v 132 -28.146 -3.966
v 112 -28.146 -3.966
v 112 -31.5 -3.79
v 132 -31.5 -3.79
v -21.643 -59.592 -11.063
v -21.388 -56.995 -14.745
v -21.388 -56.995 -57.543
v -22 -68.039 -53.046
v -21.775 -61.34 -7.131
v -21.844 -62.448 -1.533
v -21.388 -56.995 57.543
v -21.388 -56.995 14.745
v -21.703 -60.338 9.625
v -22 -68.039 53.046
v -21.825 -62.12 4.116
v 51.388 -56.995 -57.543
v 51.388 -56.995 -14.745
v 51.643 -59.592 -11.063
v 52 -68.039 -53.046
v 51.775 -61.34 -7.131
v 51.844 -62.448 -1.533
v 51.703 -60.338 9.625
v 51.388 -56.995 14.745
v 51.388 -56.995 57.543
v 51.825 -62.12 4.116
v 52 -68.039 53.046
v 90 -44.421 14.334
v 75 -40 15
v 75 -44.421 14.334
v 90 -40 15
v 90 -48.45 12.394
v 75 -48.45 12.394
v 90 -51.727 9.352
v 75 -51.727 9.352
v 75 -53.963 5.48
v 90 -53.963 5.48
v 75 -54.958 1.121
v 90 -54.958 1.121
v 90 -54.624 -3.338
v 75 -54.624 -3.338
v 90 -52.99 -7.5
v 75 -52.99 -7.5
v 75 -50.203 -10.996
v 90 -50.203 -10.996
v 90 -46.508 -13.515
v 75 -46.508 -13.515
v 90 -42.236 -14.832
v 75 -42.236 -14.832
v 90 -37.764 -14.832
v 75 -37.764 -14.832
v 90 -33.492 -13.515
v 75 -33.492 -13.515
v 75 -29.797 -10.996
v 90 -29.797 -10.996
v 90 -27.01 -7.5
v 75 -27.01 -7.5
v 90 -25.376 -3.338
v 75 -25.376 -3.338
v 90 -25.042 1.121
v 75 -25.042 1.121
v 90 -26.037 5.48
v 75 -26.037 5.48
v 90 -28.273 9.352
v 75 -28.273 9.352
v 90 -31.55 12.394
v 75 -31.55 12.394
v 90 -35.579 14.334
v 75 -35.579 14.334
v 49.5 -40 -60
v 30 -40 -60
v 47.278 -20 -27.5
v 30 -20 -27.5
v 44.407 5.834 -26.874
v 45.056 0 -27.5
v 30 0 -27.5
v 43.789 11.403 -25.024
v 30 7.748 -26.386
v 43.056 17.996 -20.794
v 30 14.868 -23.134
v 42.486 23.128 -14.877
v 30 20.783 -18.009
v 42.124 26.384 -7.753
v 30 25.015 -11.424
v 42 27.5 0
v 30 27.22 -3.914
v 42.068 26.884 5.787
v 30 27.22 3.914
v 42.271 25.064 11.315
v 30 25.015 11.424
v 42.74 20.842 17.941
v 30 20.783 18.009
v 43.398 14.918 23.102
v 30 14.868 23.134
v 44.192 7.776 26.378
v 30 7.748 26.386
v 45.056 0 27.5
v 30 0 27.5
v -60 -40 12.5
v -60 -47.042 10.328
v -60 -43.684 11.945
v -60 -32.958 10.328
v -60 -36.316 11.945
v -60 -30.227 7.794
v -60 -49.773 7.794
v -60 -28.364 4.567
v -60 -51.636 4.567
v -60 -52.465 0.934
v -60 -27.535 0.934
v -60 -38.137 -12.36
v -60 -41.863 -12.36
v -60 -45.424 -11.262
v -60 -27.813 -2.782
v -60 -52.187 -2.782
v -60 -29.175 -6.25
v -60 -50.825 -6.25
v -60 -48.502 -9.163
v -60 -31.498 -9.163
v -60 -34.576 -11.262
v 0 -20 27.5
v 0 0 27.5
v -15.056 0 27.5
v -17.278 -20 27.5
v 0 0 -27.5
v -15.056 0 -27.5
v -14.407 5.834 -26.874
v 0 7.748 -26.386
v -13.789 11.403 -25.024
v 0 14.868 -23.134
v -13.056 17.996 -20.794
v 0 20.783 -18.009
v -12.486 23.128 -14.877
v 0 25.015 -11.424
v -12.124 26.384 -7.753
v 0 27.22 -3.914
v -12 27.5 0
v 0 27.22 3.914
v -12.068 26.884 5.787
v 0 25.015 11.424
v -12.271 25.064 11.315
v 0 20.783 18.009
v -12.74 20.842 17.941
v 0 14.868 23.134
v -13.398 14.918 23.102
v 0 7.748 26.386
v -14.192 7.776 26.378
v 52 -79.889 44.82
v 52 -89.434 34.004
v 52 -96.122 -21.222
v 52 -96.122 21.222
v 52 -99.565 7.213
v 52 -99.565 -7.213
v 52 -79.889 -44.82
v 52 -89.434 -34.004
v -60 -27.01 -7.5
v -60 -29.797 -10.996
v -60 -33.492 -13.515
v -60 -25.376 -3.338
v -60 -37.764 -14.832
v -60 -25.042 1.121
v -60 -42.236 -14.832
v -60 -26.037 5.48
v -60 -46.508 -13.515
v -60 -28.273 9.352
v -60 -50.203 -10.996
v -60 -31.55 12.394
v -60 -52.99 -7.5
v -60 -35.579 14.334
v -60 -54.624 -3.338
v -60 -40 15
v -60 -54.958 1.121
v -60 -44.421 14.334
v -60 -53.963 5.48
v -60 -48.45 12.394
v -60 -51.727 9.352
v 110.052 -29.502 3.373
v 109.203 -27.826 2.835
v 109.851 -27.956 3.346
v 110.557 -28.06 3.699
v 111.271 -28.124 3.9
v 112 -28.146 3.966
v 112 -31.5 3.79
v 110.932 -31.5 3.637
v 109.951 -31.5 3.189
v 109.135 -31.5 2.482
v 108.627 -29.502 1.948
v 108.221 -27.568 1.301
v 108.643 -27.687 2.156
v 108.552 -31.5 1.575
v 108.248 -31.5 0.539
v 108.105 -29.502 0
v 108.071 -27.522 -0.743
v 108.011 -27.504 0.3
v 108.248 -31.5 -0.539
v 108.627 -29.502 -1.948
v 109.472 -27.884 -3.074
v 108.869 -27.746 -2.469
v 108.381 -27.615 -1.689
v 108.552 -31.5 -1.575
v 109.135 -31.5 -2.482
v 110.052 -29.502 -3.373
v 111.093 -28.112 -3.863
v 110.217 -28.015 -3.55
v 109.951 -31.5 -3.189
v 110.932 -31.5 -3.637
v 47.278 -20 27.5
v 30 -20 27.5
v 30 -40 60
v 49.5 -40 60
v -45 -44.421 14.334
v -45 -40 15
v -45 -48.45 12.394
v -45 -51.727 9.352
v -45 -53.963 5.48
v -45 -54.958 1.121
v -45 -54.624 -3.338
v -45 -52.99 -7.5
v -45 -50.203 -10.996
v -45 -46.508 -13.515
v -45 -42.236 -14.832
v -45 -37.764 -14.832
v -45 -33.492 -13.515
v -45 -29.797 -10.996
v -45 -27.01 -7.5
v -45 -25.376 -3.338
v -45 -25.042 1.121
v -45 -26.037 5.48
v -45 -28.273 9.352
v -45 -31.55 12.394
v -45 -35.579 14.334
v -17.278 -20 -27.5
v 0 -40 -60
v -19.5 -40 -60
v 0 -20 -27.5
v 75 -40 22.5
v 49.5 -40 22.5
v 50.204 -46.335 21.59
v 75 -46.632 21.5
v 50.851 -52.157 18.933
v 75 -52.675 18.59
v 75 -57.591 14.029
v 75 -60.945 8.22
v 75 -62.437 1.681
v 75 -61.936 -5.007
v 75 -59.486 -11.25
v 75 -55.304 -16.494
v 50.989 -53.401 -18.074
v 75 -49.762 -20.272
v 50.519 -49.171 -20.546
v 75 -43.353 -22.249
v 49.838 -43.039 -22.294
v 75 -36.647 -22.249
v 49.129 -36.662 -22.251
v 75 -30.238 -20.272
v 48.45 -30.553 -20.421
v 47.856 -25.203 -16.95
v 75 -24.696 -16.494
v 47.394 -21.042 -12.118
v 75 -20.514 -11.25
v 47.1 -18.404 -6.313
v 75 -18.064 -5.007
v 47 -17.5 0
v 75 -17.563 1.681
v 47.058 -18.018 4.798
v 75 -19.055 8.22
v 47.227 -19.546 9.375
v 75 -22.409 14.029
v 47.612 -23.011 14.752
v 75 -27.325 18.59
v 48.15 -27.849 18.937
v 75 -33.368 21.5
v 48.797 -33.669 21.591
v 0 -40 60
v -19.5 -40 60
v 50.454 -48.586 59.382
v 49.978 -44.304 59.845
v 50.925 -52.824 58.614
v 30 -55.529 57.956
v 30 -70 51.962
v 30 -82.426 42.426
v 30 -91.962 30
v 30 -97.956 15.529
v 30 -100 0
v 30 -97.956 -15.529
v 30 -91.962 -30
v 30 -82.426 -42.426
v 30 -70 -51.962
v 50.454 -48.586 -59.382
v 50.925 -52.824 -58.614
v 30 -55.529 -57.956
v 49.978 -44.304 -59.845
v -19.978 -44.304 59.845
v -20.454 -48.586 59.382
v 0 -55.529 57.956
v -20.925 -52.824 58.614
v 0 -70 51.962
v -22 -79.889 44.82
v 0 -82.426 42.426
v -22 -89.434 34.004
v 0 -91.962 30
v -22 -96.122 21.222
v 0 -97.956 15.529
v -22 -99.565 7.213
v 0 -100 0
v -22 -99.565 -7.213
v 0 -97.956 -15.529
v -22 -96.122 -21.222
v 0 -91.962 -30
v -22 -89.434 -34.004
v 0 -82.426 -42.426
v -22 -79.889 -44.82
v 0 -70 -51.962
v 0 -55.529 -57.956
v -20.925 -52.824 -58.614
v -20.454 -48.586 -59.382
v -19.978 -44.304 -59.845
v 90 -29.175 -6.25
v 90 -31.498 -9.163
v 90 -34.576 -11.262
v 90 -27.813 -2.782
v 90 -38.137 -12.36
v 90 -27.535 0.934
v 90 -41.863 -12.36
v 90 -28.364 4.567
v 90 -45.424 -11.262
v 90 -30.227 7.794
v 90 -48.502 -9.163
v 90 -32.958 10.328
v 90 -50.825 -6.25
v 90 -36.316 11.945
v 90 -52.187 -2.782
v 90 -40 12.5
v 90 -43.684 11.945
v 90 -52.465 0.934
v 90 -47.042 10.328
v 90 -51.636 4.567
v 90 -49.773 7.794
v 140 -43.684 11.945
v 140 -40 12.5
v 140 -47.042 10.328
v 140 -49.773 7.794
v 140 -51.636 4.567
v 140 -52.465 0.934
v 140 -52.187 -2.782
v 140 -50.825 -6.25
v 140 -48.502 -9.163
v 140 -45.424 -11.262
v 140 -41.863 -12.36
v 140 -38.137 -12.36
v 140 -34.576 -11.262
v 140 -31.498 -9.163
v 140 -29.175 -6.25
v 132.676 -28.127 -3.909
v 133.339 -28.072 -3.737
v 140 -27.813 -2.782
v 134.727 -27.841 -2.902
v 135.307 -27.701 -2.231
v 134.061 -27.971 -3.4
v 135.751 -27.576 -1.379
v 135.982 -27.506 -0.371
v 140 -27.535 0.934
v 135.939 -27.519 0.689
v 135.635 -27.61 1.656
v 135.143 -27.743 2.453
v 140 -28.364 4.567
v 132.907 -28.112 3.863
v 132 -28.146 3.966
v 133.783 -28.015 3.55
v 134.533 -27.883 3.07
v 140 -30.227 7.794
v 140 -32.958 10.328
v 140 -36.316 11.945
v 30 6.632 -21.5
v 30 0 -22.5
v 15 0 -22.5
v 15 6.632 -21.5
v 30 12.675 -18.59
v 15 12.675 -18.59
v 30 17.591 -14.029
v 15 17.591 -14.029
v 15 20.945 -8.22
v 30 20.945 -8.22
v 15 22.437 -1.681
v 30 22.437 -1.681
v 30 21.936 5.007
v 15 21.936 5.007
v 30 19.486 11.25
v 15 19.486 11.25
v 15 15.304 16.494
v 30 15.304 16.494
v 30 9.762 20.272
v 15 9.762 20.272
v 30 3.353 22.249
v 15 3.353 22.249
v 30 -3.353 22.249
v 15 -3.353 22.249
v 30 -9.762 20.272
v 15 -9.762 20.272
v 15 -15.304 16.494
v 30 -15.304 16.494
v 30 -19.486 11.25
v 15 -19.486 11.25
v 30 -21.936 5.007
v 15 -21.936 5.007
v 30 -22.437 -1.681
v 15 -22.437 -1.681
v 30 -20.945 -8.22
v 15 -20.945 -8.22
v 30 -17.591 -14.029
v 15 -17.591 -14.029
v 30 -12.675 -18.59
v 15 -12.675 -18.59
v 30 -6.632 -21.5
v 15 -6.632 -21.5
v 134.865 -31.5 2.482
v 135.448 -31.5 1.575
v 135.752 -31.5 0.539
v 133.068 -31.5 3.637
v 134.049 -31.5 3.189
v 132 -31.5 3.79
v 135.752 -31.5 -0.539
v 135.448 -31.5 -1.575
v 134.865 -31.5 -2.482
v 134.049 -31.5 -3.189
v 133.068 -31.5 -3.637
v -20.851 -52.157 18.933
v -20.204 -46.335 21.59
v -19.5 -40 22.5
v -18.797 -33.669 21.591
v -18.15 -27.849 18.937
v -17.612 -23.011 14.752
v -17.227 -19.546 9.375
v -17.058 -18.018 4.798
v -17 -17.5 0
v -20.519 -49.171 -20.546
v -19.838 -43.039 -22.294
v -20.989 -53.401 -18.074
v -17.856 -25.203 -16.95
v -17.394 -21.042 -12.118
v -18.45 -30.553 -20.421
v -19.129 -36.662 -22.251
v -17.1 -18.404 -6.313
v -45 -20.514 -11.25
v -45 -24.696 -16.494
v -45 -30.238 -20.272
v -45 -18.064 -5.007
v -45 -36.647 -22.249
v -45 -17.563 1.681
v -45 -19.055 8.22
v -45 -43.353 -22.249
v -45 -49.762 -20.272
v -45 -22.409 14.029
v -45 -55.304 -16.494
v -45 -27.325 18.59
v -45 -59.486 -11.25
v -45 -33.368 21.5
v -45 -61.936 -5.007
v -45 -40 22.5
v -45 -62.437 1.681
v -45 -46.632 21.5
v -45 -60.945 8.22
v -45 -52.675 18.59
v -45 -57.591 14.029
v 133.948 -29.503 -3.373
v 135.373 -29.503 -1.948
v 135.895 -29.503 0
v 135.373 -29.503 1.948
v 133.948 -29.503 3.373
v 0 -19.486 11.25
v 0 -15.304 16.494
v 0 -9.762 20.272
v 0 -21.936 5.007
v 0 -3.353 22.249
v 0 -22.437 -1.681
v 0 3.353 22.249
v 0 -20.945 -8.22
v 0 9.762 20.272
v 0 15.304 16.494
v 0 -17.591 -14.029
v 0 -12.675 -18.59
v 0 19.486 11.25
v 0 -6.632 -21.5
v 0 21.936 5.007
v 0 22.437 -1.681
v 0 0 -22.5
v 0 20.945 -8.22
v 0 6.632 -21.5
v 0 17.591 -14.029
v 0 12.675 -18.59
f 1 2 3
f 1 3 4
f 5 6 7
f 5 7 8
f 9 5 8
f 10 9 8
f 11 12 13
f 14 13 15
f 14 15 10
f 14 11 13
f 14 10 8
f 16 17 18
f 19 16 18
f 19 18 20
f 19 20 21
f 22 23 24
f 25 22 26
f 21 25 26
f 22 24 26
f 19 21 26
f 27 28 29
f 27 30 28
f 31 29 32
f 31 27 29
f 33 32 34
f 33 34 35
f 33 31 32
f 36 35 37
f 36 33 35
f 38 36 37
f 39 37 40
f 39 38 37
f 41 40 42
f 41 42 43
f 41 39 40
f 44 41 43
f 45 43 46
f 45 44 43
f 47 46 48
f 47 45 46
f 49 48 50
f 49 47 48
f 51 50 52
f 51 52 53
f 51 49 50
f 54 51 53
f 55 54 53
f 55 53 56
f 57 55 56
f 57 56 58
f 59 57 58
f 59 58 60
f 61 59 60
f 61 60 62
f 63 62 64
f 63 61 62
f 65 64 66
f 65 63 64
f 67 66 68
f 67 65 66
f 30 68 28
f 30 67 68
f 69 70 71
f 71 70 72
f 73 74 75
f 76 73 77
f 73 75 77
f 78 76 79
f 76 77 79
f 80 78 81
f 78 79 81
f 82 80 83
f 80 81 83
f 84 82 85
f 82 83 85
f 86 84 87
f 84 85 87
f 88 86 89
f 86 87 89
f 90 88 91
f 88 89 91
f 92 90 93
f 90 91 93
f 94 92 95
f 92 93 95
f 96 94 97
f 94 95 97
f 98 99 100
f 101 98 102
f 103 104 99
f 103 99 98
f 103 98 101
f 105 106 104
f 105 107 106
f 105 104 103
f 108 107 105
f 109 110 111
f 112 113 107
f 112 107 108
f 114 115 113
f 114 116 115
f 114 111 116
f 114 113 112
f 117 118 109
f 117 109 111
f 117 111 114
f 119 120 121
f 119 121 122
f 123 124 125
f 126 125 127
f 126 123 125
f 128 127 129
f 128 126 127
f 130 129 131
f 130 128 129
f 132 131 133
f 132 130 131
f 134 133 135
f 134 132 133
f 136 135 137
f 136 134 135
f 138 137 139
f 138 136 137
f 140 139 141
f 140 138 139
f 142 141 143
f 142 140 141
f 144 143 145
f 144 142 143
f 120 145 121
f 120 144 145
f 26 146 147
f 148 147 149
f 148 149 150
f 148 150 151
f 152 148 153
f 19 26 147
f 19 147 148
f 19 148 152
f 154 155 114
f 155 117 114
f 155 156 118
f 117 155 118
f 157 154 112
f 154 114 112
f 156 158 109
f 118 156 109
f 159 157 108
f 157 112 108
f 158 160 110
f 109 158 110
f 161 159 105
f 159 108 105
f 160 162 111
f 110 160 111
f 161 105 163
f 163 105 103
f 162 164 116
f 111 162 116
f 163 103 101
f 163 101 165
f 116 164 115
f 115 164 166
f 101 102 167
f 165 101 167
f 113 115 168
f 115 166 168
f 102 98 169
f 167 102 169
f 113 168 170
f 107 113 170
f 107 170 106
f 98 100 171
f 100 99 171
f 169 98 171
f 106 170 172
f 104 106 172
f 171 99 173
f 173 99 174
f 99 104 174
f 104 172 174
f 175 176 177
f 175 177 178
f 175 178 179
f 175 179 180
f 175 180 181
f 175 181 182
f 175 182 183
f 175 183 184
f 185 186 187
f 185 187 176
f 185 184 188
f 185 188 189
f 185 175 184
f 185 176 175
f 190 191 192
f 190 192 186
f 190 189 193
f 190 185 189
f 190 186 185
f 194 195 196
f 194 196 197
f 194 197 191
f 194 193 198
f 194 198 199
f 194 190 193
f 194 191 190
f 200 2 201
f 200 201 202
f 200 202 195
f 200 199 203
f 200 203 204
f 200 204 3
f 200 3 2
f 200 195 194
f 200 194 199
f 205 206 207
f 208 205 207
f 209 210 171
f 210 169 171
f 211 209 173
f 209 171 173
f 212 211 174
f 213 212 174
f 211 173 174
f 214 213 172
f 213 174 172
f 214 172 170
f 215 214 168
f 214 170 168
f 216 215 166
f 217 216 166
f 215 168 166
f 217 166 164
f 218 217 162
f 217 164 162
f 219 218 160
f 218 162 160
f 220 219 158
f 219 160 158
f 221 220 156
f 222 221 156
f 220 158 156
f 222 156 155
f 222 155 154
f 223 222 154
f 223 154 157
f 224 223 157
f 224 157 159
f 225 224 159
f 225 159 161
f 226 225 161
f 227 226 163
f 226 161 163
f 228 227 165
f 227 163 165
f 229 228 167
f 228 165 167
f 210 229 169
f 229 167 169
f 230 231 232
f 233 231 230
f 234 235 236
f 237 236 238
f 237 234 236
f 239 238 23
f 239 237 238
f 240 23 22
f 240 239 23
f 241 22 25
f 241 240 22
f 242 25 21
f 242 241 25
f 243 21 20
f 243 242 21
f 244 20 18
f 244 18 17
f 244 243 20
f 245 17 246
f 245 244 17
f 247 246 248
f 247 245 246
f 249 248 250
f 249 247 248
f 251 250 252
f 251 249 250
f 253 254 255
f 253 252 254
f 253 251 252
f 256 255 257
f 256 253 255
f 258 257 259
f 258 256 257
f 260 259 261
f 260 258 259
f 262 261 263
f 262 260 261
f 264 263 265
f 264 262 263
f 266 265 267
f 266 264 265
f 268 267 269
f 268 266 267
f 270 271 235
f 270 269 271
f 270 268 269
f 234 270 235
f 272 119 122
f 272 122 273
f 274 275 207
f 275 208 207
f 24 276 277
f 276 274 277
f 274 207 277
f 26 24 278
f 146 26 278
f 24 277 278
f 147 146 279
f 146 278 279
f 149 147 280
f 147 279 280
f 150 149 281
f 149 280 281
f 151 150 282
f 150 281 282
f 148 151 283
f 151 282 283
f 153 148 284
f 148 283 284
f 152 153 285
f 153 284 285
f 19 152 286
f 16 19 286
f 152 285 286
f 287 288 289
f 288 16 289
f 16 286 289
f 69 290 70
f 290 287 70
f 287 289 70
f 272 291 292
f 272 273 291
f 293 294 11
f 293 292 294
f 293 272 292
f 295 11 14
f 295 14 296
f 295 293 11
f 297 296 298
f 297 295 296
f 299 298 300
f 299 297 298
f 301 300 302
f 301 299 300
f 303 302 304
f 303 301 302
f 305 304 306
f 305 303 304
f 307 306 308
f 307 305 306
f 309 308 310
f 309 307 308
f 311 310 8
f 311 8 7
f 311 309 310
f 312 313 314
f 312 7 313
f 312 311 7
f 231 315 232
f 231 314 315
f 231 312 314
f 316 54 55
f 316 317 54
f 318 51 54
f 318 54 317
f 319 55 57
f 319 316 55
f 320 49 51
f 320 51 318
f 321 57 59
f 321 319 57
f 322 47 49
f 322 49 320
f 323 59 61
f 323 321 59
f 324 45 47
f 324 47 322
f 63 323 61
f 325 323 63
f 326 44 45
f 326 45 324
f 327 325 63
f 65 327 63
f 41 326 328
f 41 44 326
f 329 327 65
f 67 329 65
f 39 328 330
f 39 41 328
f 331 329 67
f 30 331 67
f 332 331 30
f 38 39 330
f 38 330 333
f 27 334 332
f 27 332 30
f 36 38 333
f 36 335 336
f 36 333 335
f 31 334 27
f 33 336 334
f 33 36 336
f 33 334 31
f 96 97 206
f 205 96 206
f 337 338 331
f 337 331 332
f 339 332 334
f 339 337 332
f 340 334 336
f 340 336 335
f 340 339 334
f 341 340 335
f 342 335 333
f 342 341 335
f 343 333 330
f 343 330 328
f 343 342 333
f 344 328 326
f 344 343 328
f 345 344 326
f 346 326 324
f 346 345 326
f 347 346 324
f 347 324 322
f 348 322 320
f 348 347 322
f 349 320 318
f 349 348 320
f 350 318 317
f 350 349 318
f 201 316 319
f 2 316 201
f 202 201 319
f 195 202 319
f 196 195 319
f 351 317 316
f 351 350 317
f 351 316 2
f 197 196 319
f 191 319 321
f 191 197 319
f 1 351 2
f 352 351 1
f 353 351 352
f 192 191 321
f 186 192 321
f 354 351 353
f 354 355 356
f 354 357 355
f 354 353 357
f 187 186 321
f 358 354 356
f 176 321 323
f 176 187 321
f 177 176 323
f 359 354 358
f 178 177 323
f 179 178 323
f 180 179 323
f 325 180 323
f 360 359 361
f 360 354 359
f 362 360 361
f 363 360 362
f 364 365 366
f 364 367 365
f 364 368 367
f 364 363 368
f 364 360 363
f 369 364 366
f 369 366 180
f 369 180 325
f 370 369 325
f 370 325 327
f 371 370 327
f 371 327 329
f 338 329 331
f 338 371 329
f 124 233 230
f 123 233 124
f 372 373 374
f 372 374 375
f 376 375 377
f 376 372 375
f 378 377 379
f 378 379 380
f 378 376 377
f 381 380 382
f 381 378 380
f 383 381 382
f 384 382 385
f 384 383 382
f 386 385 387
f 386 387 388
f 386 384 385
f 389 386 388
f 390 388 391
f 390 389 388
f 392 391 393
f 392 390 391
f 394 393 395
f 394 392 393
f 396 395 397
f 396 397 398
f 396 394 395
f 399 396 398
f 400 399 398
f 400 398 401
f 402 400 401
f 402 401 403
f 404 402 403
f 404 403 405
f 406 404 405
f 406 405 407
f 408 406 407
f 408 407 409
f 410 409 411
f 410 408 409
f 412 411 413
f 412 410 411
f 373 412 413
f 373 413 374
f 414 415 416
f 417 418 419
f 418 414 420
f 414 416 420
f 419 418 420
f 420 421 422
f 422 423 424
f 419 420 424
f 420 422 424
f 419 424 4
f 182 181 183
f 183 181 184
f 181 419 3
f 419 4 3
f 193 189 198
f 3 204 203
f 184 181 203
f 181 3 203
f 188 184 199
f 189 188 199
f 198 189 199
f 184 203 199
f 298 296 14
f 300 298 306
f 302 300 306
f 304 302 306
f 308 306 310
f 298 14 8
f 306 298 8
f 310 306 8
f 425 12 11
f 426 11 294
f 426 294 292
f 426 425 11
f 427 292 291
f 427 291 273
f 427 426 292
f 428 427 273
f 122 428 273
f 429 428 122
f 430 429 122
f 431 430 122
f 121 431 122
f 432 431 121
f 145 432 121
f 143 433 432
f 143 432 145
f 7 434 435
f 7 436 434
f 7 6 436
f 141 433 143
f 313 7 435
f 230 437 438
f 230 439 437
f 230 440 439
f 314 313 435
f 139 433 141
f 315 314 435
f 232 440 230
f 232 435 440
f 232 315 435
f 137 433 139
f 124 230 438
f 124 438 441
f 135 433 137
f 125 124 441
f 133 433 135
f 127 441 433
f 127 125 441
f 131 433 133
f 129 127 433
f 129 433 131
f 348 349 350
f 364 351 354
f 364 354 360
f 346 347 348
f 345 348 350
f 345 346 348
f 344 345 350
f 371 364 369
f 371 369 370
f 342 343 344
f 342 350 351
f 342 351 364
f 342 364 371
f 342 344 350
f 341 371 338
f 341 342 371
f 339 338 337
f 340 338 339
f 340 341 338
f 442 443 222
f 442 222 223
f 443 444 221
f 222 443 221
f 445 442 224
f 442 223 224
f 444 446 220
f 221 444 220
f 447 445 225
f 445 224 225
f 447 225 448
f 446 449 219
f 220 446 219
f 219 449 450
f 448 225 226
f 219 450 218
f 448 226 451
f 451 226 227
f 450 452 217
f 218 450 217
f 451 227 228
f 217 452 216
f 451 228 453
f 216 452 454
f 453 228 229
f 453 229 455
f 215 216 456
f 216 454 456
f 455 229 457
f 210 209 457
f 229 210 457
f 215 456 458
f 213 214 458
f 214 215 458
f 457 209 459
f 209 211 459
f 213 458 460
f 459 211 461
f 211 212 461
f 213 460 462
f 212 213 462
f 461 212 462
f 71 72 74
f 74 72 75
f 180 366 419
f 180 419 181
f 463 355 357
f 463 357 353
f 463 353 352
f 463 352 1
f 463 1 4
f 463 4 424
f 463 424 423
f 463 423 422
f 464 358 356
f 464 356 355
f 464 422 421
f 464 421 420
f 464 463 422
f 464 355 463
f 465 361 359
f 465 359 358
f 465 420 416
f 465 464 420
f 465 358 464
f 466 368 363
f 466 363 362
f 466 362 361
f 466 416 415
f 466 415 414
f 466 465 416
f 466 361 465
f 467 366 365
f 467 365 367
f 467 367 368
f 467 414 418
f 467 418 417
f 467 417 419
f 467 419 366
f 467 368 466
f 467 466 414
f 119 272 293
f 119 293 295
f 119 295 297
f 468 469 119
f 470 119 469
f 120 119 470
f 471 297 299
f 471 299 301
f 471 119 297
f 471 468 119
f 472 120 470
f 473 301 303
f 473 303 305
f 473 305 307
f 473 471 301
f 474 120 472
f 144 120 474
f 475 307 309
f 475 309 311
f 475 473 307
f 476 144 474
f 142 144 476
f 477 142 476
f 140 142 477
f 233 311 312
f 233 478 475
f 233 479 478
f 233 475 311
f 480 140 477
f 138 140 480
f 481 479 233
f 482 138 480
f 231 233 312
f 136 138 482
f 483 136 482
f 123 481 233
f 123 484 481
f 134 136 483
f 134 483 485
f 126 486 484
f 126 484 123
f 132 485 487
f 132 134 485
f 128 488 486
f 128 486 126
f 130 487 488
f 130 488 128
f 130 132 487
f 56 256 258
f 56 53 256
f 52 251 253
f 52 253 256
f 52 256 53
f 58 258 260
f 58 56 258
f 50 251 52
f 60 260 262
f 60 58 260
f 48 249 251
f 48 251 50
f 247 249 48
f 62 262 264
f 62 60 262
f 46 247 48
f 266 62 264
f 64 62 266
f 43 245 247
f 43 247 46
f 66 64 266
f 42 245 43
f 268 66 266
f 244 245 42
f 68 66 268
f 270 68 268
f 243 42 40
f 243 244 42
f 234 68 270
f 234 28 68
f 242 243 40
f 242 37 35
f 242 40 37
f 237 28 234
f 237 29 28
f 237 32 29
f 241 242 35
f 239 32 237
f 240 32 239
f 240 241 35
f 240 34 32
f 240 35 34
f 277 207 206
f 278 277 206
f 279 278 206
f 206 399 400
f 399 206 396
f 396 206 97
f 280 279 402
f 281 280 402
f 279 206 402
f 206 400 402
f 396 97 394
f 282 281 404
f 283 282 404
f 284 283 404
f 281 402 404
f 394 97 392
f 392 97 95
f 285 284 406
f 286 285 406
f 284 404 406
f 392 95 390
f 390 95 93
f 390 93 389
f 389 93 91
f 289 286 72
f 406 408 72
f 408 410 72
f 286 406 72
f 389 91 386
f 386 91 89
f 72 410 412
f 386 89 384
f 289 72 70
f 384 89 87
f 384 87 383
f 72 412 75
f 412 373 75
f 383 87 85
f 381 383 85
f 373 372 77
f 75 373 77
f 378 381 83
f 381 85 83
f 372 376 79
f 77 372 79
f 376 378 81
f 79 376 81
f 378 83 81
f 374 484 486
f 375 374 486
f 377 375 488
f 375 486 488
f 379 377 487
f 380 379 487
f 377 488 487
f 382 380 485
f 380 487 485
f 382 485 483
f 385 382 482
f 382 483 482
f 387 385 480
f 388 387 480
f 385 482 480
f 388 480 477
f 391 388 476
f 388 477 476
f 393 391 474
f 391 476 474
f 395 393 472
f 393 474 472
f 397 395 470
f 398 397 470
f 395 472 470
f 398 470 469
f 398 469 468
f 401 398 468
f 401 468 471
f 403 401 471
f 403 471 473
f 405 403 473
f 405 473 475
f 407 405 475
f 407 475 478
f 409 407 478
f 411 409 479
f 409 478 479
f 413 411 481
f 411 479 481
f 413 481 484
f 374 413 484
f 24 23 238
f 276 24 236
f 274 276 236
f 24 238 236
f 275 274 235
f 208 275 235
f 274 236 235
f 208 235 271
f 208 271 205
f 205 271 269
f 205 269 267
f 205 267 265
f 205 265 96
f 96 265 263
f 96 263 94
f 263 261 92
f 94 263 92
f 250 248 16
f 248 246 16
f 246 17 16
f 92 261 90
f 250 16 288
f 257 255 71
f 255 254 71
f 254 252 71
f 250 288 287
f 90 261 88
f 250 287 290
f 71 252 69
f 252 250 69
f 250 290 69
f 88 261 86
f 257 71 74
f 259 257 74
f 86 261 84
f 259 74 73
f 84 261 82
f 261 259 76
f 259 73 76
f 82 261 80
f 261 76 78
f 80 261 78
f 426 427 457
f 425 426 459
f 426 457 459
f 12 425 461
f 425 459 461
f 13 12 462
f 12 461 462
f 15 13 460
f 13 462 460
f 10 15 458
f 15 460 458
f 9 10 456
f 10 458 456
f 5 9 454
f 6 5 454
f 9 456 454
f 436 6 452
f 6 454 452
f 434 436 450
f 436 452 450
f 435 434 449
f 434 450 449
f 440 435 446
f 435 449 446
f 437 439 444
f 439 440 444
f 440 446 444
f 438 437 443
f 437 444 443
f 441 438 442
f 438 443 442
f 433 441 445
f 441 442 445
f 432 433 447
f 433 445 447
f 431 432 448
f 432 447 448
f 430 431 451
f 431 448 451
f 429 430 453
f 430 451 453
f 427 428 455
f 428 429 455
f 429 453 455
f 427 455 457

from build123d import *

# Parameters (mm, degrees)
SKETCH2_R               = 22.5
BOSS_EXTRUDE1_DEPTH     = 15
BOSS_EXTRUDE2_DEPTH     = 22
CUT_EXTRUDE2_DEPTH      = 119.676029593
CUT_EXTRUDE2_DEPTH_BACK = 119.676029593
FILLET1_R               = 100
CUT_EXTRUDE3_START      = -27.5
CUT_EXTRUDE3_DEPTH      = 4
CUT_EXTRUDE3_DRAFT      = -3
CUT_EXTRUDE7_DEPTH      = 183.208671748
CUT_EXTRUDE7_DEPTH_BACK = 183.208671748


with BuildPart() as part:
    # Sketch2 → Boss-Extrude1 (new body)
    with BuildSketch(Plane(origin=(0, 0, 0), x_dir=(0, 0, -1), z_dir=(1, 0, 0))):
        Circle(SKETCH2_R)
    extrude(amount=BOSS_EXTRUDE1_DEPTH)

    # Sketch3 → Boss-Extrude2 (add)
    with BuildSketch(Plane(origin=(0, 0, 0), x_dir=(0, 0, -1), z_dir=(1, 0, 0))):
        with BuildLine():
            Line((-27.5, 0), (-27.5, -20))
            Line((-27.5, -20), (-60, -40))
            ThreePointArc((-60, -40), (0, -100), (60, -40))
            Line((60, -40), (27.5, -20))
            Line((27.5, -20), (27.5, 0))
            ThreePointArc((27.5, 0), (0, 27.5), (-27.5, 0))
        make_face()
    extrude(amount=-BOSS_EXTRUDE2_DEPTH)

    # Sketch4 → Cut-Extrude2 (cut, two sides: drawn at the far end of the back side and taken through both)
    with BuildSketch(Plane.XY.offset(-CUT_EXTRUDE2_DEPTH_BACK)):
        Polygon((-12, 27.5), (-22, 27.5), (-22, -62.5), align=None)
    extrude(amount=CUT_EXTRUDE2_DEPTH + CUT_EXTRUDE2_DEPTH_BACK, mode=Mode.SUBTRACT)

    # Fillet1
    fillet1_edges = [part.edges().sort_by_distance(p)[0] for p in [
        (-22, -62.5, 0),
    ]]
    fillet(fillet1_edges, radius=FILLET1_R)

    # Sketch6 → Revolve1 (revolve)
    with BuildSketch(Plane.XY, mode=Mode.PRIVATE) as revolve1_sk:
        Polygon((-17, -17.5), (-45, -17.5), (-45, -25), (-60, -25), (-60, -27.5), (-110, -27.5), (-110, -40), (-17, -40), align=None)
    revolve(revolve1_sk.sketch.rotate(Axis((0, -40, 0), (1, 0, 0)), 90), axis=Axis((0, -40, 0), (1, 0, 0)))


with BuildPart() as cut_extrude3_tool:
    # Sketch8 → Cut-Extrude3 (with draft: the straight prism first)
    with BuildSketch(Plane(origin=(0, 0, 0), x_dir=(1, 0, 0), z_dir=(0, 1, 0)).offset(CUT_EXTRUDE3_START)):
        with BuildLine():
            ThreePointArc((-82, -4), (-78, 0), (-82, 4))
            Line((-82, 4), (-102, 4))
            ThreePointArc((-102, 4), (-106, 0), (-102, -4))
            Line((-102, -4), (-82, -4))
        make_face()
    extrude(amount=-CUT_EXTRUDE3_DEPTH)
    # Cut-Extrude3: the draft: its side faces are tilted about the plane it starts from
    cut_extrude3_sides = [cut_extrude3_tool.faces().sort_by_distance(p)[0] for p in [
        (-78, -29.5, 0),
        (-92, -29.5, -4),
        (-106, -29.5, 0),
        (-92, -29.5, 4),
    ]]
    draft(cut_extrude3_sides, Plane(origin=(0, 0, 0), x_dir=(1, 0, 0), z_dir=(0, 1, 0)).offset(CUT_EXTRUDE3_START), CUT_EXTRUDE3_DRAFT)


with BuildPart() as part_1:
    add(part.part)

    # Cut-Extrude3: cut by cut_extrude3_tool
    add(cut_extrude3_tool.part, mode=Mode.SUBTRACT)

    # Mirror2: part across plane


with BuildPart() as part_2:
    add(part_1.part)
    add(part_1.part.mirror(Plane(origin=(15, 0, 0), x_dir=(0, 0, 1), z_dir=(1, 0, 0))))

    # Sketch9 → Cut-Extrude7 (cut, two sides: drawn at the far end of the back side and taken through both)
    with BuildSketch(Plane.XY.offset(-CUT_EXTRUDE7_DEPTH_BACK)):
        Polygon((-60, -63.744180842), (-60, 19.972023277), (-60, 24.234333035), (-120.234198747, 24.234333035), (-120.234198747, -63.744180842), align=None)
    extrude(amount=CUT_EXTRUDE7_DEPTH + CUT_EXTRUDE7_DEPTH_BACK, mode=Mode.SUBTRACT)


solid = part_2.part
